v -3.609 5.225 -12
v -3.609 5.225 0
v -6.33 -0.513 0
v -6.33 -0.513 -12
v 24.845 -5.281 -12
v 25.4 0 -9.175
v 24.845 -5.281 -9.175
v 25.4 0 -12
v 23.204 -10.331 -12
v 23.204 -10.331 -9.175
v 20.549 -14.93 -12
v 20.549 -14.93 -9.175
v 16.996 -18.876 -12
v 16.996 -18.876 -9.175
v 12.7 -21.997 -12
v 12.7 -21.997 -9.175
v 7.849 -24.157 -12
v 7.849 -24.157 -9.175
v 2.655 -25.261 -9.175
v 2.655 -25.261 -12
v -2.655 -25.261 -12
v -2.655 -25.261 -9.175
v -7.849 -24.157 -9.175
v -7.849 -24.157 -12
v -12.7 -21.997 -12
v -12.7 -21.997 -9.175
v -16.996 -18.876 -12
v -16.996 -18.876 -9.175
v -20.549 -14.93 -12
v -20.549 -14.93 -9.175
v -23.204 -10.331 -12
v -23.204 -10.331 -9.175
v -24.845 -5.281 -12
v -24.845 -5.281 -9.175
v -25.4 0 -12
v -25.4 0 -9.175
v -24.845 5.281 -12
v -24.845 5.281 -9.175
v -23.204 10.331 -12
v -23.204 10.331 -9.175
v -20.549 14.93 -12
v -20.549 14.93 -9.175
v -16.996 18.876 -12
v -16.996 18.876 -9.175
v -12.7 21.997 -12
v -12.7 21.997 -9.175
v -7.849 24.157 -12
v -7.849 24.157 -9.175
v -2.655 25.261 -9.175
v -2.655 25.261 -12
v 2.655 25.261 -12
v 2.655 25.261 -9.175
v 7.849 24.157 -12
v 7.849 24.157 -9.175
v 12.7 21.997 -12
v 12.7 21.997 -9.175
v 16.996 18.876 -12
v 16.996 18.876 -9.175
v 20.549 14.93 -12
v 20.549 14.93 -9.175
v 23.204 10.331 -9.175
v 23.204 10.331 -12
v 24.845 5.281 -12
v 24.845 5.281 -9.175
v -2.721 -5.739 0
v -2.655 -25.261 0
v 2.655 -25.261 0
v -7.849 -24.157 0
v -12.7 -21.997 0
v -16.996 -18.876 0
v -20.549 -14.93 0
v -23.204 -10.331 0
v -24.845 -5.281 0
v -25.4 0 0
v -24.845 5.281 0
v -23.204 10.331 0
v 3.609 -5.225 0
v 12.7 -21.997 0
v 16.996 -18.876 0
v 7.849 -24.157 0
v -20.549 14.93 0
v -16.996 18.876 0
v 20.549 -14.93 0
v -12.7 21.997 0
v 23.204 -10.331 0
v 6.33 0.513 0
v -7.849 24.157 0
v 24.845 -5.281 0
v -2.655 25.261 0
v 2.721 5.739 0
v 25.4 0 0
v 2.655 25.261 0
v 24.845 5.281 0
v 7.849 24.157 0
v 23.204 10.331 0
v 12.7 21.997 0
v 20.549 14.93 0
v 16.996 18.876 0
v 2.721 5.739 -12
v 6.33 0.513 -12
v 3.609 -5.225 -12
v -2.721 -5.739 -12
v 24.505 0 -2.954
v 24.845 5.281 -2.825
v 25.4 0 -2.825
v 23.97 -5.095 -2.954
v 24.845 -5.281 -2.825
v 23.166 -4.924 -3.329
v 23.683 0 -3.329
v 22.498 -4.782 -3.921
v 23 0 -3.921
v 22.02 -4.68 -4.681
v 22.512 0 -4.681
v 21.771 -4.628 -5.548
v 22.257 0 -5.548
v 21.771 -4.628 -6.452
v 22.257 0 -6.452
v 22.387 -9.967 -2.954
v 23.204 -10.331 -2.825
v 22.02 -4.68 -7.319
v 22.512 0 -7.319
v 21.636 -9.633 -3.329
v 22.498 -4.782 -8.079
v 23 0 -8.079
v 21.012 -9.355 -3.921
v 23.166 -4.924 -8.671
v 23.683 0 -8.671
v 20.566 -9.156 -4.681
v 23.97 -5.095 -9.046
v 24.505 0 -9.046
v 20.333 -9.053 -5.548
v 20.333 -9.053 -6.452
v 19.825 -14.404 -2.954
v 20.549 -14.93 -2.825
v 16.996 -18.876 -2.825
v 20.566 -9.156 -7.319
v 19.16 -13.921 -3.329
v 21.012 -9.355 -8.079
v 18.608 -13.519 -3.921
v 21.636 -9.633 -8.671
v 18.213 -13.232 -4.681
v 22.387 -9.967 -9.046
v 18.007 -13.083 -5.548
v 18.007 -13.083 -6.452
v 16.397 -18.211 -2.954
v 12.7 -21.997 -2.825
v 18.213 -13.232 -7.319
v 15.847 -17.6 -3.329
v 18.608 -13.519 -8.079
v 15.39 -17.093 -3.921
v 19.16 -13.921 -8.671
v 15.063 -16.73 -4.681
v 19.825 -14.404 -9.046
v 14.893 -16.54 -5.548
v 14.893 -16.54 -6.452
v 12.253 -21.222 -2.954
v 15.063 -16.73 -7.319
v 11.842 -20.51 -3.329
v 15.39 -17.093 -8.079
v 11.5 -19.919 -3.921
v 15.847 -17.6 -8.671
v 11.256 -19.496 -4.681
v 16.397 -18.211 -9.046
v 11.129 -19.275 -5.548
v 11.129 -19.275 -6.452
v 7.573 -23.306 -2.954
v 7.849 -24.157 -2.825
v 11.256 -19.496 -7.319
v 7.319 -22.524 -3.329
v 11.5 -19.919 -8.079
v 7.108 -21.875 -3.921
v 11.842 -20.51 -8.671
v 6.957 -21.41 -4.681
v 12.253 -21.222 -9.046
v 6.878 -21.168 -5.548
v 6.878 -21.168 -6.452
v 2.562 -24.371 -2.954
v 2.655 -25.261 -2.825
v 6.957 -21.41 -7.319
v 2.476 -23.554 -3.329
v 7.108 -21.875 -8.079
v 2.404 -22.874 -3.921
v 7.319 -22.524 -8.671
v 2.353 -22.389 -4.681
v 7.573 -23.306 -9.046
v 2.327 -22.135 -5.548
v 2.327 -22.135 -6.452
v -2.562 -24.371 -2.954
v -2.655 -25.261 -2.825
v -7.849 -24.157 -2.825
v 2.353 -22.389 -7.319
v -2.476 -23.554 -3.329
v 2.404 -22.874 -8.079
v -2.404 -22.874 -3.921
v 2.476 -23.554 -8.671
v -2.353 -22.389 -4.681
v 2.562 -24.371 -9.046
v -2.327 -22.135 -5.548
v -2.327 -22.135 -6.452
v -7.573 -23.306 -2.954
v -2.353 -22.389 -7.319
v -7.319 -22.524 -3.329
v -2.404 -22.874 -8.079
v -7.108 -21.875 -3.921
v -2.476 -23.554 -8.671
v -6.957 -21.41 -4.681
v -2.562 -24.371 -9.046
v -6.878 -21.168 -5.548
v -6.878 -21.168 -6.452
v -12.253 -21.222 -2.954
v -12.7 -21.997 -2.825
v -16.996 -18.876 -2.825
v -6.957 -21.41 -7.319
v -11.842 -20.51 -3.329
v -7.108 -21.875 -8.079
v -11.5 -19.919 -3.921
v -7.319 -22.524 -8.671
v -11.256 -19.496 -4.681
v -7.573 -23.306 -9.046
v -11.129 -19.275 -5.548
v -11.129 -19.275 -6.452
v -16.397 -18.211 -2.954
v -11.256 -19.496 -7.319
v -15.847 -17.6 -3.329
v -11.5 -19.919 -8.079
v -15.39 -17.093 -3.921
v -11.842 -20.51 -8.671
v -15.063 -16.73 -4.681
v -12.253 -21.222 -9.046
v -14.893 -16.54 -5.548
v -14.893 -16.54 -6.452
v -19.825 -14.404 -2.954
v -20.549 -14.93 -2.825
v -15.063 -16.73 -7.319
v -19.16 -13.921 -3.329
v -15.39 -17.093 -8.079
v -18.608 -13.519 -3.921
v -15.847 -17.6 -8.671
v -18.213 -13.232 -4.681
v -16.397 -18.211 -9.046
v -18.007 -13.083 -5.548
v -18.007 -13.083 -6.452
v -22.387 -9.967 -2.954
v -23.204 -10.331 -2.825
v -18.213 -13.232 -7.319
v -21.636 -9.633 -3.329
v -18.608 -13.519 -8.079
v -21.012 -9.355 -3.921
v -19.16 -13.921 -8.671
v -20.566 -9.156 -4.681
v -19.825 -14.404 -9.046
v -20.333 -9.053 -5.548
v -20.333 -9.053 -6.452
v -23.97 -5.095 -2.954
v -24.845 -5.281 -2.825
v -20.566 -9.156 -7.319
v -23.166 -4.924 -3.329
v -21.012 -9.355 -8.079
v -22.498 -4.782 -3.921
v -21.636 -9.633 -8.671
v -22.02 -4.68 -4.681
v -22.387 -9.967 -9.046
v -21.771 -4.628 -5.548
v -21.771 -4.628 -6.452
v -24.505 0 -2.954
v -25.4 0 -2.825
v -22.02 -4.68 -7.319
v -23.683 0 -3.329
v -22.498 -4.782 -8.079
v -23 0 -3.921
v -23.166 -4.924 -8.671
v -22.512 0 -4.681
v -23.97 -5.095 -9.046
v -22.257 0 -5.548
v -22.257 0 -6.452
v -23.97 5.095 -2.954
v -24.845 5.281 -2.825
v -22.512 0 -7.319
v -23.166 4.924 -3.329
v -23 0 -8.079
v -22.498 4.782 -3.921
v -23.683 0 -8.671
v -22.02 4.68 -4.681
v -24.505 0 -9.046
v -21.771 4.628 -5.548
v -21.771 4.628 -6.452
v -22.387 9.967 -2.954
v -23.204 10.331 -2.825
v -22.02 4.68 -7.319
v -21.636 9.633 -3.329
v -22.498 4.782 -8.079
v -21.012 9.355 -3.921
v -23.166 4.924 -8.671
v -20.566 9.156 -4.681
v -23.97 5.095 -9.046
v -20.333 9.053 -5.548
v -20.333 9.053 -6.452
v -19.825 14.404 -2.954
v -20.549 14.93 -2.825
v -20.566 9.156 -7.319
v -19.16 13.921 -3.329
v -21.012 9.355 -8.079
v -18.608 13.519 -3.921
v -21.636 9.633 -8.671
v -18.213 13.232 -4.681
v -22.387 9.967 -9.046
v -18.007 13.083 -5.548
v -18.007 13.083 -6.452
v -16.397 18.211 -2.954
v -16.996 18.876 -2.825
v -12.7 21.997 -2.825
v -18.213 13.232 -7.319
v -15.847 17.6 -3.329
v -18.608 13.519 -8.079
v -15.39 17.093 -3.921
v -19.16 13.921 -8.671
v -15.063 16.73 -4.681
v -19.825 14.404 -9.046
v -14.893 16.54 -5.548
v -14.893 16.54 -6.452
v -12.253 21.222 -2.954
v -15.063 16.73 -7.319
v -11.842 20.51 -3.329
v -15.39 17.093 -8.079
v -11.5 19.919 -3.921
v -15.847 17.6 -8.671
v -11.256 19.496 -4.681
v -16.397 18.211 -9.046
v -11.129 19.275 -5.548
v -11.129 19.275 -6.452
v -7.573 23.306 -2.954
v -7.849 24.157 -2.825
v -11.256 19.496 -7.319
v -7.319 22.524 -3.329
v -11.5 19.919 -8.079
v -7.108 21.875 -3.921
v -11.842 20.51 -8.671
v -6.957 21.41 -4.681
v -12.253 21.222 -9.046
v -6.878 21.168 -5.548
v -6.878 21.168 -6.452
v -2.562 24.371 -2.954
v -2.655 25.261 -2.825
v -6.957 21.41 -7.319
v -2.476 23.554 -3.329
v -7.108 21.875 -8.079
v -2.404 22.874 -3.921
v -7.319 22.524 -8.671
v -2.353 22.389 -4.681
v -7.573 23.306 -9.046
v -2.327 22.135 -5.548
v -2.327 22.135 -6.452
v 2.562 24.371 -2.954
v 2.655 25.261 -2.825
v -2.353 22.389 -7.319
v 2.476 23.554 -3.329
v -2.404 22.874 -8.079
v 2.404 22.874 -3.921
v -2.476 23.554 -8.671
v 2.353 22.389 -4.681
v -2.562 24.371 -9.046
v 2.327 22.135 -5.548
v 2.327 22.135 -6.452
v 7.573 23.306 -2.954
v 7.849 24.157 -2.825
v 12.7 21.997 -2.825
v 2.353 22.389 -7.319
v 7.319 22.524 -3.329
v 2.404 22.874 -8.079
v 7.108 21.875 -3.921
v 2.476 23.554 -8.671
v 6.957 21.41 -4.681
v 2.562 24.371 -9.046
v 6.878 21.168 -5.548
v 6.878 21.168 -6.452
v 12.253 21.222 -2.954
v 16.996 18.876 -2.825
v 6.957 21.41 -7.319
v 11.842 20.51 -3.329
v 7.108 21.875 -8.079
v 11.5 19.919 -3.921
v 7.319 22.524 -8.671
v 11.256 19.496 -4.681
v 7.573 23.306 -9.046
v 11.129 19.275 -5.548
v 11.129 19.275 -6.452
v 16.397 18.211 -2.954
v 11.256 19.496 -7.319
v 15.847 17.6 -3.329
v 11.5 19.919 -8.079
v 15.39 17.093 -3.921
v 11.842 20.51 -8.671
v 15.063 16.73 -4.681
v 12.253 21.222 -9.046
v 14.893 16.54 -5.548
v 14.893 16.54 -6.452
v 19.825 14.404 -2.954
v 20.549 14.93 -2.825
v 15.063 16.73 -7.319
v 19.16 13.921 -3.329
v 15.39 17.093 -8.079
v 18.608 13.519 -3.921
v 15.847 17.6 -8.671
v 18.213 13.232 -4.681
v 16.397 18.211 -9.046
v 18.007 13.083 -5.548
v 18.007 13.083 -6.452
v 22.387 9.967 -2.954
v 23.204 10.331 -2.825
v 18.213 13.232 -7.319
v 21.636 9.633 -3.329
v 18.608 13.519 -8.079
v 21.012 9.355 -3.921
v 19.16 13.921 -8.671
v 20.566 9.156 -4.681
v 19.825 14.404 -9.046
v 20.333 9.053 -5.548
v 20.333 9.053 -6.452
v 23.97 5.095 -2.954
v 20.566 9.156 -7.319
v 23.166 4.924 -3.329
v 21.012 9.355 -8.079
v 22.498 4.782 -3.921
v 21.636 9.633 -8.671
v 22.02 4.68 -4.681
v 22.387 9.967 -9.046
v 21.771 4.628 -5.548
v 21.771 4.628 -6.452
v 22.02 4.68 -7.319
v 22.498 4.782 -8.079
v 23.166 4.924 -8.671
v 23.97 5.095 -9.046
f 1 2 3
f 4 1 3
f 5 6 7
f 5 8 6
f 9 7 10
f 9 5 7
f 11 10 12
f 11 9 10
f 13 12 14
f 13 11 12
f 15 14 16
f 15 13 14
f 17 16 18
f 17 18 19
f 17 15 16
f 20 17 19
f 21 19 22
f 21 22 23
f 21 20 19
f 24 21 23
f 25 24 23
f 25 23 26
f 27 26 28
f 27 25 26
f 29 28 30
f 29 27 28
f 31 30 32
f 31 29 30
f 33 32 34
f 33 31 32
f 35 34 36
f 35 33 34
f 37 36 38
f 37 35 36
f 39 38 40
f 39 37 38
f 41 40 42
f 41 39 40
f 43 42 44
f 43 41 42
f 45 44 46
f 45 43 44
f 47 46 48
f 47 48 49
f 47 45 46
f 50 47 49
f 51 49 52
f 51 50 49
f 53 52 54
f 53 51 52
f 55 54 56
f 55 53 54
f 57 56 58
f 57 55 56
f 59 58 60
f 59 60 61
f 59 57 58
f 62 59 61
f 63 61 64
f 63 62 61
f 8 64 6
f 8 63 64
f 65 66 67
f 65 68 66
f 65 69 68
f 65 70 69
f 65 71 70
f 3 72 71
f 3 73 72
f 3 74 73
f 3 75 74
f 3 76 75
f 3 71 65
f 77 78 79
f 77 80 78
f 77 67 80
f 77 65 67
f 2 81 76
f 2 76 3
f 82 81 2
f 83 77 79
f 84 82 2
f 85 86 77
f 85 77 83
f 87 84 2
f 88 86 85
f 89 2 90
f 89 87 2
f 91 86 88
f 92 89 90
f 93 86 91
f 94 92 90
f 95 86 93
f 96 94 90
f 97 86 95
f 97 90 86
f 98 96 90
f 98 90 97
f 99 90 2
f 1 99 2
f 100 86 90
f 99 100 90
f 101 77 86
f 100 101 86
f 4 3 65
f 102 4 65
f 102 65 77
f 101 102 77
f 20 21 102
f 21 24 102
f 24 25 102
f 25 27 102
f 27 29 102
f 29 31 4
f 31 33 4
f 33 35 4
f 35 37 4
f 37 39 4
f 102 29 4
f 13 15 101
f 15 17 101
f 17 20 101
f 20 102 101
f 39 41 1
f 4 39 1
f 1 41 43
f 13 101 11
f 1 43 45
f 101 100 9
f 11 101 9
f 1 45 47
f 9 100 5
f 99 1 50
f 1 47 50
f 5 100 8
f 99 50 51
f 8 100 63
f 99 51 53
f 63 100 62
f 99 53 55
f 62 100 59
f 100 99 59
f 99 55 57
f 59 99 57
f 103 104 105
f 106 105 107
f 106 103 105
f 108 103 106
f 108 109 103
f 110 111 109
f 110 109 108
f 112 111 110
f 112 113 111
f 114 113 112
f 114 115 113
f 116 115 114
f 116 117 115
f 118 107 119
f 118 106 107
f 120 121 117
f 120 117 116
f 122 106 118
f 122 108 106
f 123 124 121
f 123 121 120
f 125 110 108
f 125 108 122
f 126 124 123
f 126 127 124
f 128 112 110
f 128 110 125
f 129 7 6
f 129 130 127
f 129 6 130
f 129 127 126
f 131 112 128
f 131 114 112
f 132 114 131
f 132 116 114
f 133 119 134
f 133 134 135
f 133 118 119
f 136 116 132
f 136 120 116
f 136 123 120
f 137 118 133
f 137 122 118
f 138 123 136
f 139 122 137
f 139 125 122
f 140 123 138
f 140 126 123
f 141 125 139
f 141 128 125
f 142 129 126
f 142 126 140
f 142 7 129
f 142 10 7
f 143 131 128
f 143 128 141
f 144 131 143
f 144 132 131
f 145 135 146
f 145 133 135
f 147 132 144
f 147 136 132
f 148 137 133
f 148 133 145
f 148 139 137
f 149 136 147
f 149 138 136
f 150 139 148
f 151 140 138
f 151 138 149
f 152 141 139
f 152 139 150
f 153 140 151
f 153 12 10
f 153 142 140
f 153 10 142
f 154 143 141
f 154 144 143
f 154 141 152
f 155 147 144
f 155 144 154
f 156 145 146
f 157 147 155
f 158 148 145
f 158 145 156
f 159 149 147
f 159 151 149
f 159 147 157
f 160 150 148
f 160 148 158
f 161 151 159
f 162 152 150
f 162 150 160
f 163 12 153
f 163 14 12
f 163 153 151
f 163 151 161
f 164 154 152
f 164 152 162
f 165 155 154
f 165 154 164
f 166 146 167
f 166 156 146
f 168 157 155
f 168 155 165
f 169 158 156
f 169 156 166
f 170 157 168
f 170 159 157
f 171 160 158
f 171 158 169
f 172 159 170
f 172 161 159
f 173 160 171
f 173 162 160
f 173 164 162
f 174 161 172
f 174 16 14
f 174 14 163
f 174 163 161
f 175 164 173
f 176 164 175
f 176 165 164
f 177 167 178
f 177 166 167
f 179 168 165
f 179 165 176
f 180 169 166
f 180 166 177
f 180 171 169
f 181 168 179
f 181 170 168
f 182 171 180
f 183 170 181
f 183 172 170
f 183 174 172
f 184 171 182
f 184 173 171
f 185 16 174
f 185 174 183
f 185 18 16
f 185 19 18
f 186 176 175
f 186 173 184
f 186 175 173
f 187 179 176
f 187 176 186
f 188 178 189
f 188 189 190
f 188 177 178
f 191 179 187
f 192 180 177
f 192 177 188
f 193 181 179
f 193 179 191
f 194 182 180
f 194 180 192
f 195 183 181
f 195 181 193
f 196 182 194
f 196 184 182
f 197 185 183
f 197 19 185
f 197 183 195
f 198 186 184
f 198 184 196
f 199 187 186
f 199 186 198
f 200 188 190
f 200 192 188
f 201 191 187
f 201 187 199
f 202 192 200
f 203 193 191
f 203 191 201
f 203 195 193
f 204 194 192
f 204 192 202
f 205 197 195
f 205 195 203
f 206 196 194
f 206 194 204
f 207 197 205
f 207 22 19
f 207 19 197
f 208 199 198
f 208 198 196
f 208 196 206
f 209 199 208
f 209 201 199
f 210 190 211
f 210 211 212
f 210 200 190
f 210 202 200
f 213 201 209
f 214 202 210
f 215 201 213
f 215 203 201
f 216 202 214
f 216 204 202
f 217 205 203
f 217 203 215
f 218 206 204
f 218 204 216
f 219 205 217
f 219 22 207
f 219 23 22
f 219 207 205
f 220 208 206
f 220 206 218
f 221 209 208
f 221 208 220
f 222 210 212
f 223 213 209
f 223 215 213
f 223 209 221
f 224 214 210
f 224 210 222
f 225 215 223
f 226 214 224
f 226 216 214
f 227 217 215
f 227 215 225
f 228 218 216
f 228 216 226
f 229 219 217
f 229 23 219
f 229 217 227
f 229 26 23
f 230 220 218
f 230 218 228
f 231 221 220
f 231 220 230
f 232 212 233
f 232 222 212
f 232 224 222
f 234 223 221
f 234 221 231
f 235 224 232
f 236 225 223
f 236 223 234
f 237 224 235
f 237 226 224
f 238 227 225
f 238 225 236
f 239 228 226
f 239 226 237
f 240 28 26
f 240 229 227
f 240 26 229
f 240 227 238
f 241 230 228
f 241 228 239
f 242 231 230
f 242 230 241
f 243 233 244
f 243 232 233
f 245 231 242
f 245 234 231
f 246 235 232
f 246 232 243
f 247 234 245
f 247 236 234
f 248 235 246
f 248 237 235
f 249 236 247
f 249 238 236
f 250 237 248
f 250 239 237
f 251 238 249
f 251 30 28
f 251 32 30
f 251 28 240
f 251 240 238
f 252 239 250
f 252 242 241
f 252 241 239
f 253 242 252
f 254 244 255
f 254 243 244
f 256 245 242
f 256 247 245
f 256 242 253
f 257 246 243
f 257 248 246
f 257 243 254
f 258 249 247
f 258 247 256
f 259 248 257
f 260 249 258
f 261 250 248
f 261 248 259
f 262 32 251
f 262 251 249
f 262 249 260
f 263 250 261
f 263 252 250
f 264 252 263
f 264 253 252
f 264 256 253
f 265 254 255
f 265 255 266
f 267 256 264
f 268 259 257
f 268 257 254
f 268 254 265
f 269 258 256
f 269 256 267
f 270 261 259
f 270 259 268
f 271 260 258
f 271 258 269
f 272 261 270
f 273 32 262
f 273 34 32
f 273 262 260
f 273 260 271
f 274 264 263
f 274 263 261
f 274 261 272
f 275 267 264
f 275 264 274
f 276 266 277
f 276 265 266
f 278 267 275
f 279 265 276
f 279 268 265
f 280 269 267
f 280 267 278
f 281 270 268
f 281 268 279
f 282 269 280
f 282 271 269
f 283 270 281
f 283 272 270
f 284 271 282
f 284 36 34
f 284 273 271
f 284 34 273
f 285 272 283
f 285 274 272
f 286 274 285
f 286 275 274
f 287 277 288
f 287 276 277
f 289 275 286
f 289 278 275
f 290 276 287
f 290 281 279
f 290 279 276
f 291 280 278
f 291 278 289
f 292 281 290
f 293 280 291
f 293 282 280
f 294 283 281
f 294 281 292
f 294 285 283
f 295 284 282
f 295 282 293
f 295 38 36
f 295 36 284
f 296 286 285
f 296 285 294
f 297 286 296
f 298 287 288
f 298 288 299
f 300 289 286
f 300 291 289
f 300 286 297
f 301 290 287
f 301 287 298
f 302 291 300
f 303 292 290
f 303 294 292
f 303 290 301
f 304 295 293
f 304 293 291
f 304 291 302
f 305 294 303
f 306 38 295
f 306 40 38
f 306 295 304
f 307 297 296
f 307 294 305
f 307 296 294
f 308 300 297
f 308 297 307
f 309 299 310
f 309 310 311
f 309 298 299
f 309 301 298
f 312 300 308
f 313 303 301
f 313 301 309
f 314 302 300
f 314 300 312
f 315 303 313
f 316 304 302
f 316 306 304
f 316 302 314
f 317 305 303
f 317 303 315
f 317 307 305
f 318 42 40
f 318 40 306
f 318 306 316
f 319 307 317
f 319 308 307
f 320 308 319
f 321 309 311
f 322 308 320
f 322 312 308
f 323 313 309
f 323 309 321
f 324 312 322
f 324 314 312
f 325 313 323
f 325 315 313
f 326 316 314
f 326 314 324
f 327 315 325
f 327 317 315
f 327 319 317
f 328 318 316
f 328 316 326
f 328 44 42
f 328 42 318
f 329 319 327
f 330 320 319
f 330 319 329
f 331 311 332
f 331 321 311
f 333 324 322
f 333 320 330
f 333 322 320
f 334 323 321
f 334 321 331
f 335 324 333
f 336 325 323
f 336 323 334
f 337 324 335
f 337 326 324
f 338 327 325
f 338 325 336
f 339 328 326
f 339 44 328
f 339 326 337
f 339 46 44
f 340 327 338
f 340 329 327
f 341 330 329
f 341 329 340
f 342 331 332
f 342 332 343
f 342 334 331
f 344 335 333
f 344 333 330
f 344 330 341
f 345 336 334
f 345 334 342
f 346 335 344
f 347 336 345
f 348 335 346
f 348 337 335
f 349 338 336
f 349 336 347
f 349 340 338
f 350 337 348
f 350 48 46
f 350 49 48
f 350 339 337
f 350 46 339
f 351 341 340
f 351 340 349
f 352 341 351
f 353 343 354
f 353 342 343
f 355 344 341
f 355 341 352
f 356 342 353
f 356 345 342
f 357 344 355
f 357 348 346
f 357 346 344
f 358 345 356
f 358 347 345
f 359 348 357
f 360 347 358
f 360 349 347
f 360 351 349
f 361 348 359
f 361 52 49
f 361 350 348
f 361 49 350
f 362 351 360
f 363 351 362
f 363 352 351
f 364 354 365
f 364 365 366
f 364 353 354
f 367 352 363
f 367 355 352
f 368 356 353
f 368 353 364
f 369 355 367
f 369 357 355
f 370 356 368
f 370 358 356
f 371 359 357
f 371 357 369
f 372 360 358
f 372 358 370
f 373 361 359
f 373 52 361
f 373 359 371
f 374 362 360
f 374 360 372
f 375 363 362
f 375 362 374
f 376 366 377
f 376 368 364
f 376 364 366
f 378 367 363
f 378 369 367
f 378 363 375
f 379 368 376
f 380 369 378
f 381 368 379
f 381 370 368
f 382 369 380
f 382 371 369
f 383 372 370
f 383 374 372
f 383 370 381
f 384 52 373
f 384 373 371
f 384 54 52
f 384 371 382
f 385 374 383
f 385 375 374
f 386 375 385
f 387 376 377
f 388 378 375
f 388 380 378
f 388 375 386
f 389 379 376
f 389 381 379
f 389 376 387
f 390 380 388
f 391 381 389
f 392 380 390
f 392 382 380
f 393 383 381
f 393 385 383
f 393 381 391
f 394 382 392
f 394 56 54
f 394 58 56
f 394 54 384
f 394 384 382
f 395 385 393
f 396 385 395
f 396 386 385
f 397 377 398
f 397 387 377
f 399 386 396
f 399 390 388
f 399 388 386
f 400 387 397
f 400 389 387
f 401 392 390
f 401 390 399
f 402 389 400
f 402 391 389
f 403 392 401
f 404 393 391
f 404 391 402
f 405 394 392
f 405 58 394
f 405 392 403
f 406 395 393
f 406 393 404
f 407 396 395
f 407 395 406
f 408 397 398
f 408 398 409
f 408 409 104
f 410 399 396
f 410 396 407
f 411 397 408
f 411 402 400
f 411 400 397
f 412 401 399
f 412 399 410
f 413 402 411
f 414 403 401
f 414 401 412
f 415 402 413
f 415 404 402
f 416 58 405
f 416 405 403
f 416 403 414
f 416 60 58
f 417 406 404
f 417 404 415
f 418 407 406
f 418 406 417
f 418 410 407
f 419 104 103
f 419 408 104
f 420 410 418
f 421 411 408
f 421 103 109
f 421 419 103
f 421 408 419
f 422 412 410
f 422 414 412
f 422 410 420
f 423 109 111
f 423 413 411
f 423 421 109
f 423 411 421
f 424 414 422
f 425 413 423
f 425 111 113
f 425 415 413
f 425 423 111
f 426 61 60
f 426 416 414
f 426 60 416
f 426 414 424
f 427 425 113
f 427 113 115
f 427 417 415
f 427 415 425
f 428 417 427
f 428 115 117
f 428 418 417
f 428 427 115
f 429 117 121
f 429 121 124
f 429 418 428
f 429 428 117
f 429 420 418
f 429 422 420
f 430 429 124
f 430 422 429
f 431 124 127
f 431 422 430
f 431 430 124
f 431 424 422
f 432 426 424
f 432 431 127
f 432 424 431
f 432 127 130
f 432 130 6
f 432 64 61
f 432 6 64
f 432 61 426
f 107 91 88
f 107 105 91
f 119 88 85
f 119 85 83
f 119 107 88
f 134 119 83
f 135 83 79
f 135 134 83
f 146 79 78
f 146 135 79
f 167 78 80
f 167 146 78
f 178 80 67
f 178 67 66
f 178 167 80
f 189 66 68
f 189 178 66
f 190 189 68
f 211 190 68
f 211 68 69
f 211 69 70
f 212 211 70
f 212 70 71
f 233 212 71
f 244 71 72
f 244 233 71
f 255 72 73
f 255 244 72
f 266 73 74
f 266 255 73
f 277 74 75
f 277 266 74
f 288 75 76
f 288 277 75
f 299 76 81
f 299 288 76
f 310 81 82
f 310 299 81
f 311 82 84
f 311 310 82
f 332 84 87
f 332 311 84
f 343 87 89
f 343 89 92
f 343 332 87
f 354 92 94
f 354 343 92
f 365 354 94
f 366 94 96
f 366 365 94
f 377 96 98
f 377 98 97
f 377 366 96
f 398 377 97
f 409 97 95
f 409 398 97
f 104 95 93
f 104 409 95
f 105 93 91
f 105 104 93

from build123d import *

# Parameters (mm, degrees)
SKETCH2_R           = 12.7
BOSS_EXTRUDE1_DEPTH = 12


with BuildPart() as part:
    # Sketch1 → Revolve1 (revolve)
    with BuildSketch(Plane(origin=(0, 0, 0), x_dir=(1, 0, 0), z_dir=(0, 1, 0))):
        with BuildLine():
            Line((12.7, 0), (25.4, 0))
            Line((25.4, 0), (25.4, 2.825))
            ThreePointArc((25.4, 2.825), (22.225, 6), (25.4, 9.175))
            Line((25.4, 9.175), (25.4, 12))
            Line((25.4, 12), (12.7, 12))
            Line((12.7, 12), (12.7, 0))
        make_face()
    revolve(axis=Axis((0, 0, 0), (0, 0, -1)))

    # Sketch2 → Boss-Extrude1 (add)
    with BuildSketch(Plane.XY):
        Circle(SKETCH2_R)
        Polygon((3.609388519, -5.225480634), (6.330093235, 0.513081832), (2.720704717, 5.738562466), (-3.609388519, 5.225480634), (-6.330093235, -0.513081832), (-2.720704717, -5.738562466), align=None, mode=Mode.SUBTRACT)
    extrude(amount=-BOSS_EXTRUDE1_DEPTH)


solid = part.part
